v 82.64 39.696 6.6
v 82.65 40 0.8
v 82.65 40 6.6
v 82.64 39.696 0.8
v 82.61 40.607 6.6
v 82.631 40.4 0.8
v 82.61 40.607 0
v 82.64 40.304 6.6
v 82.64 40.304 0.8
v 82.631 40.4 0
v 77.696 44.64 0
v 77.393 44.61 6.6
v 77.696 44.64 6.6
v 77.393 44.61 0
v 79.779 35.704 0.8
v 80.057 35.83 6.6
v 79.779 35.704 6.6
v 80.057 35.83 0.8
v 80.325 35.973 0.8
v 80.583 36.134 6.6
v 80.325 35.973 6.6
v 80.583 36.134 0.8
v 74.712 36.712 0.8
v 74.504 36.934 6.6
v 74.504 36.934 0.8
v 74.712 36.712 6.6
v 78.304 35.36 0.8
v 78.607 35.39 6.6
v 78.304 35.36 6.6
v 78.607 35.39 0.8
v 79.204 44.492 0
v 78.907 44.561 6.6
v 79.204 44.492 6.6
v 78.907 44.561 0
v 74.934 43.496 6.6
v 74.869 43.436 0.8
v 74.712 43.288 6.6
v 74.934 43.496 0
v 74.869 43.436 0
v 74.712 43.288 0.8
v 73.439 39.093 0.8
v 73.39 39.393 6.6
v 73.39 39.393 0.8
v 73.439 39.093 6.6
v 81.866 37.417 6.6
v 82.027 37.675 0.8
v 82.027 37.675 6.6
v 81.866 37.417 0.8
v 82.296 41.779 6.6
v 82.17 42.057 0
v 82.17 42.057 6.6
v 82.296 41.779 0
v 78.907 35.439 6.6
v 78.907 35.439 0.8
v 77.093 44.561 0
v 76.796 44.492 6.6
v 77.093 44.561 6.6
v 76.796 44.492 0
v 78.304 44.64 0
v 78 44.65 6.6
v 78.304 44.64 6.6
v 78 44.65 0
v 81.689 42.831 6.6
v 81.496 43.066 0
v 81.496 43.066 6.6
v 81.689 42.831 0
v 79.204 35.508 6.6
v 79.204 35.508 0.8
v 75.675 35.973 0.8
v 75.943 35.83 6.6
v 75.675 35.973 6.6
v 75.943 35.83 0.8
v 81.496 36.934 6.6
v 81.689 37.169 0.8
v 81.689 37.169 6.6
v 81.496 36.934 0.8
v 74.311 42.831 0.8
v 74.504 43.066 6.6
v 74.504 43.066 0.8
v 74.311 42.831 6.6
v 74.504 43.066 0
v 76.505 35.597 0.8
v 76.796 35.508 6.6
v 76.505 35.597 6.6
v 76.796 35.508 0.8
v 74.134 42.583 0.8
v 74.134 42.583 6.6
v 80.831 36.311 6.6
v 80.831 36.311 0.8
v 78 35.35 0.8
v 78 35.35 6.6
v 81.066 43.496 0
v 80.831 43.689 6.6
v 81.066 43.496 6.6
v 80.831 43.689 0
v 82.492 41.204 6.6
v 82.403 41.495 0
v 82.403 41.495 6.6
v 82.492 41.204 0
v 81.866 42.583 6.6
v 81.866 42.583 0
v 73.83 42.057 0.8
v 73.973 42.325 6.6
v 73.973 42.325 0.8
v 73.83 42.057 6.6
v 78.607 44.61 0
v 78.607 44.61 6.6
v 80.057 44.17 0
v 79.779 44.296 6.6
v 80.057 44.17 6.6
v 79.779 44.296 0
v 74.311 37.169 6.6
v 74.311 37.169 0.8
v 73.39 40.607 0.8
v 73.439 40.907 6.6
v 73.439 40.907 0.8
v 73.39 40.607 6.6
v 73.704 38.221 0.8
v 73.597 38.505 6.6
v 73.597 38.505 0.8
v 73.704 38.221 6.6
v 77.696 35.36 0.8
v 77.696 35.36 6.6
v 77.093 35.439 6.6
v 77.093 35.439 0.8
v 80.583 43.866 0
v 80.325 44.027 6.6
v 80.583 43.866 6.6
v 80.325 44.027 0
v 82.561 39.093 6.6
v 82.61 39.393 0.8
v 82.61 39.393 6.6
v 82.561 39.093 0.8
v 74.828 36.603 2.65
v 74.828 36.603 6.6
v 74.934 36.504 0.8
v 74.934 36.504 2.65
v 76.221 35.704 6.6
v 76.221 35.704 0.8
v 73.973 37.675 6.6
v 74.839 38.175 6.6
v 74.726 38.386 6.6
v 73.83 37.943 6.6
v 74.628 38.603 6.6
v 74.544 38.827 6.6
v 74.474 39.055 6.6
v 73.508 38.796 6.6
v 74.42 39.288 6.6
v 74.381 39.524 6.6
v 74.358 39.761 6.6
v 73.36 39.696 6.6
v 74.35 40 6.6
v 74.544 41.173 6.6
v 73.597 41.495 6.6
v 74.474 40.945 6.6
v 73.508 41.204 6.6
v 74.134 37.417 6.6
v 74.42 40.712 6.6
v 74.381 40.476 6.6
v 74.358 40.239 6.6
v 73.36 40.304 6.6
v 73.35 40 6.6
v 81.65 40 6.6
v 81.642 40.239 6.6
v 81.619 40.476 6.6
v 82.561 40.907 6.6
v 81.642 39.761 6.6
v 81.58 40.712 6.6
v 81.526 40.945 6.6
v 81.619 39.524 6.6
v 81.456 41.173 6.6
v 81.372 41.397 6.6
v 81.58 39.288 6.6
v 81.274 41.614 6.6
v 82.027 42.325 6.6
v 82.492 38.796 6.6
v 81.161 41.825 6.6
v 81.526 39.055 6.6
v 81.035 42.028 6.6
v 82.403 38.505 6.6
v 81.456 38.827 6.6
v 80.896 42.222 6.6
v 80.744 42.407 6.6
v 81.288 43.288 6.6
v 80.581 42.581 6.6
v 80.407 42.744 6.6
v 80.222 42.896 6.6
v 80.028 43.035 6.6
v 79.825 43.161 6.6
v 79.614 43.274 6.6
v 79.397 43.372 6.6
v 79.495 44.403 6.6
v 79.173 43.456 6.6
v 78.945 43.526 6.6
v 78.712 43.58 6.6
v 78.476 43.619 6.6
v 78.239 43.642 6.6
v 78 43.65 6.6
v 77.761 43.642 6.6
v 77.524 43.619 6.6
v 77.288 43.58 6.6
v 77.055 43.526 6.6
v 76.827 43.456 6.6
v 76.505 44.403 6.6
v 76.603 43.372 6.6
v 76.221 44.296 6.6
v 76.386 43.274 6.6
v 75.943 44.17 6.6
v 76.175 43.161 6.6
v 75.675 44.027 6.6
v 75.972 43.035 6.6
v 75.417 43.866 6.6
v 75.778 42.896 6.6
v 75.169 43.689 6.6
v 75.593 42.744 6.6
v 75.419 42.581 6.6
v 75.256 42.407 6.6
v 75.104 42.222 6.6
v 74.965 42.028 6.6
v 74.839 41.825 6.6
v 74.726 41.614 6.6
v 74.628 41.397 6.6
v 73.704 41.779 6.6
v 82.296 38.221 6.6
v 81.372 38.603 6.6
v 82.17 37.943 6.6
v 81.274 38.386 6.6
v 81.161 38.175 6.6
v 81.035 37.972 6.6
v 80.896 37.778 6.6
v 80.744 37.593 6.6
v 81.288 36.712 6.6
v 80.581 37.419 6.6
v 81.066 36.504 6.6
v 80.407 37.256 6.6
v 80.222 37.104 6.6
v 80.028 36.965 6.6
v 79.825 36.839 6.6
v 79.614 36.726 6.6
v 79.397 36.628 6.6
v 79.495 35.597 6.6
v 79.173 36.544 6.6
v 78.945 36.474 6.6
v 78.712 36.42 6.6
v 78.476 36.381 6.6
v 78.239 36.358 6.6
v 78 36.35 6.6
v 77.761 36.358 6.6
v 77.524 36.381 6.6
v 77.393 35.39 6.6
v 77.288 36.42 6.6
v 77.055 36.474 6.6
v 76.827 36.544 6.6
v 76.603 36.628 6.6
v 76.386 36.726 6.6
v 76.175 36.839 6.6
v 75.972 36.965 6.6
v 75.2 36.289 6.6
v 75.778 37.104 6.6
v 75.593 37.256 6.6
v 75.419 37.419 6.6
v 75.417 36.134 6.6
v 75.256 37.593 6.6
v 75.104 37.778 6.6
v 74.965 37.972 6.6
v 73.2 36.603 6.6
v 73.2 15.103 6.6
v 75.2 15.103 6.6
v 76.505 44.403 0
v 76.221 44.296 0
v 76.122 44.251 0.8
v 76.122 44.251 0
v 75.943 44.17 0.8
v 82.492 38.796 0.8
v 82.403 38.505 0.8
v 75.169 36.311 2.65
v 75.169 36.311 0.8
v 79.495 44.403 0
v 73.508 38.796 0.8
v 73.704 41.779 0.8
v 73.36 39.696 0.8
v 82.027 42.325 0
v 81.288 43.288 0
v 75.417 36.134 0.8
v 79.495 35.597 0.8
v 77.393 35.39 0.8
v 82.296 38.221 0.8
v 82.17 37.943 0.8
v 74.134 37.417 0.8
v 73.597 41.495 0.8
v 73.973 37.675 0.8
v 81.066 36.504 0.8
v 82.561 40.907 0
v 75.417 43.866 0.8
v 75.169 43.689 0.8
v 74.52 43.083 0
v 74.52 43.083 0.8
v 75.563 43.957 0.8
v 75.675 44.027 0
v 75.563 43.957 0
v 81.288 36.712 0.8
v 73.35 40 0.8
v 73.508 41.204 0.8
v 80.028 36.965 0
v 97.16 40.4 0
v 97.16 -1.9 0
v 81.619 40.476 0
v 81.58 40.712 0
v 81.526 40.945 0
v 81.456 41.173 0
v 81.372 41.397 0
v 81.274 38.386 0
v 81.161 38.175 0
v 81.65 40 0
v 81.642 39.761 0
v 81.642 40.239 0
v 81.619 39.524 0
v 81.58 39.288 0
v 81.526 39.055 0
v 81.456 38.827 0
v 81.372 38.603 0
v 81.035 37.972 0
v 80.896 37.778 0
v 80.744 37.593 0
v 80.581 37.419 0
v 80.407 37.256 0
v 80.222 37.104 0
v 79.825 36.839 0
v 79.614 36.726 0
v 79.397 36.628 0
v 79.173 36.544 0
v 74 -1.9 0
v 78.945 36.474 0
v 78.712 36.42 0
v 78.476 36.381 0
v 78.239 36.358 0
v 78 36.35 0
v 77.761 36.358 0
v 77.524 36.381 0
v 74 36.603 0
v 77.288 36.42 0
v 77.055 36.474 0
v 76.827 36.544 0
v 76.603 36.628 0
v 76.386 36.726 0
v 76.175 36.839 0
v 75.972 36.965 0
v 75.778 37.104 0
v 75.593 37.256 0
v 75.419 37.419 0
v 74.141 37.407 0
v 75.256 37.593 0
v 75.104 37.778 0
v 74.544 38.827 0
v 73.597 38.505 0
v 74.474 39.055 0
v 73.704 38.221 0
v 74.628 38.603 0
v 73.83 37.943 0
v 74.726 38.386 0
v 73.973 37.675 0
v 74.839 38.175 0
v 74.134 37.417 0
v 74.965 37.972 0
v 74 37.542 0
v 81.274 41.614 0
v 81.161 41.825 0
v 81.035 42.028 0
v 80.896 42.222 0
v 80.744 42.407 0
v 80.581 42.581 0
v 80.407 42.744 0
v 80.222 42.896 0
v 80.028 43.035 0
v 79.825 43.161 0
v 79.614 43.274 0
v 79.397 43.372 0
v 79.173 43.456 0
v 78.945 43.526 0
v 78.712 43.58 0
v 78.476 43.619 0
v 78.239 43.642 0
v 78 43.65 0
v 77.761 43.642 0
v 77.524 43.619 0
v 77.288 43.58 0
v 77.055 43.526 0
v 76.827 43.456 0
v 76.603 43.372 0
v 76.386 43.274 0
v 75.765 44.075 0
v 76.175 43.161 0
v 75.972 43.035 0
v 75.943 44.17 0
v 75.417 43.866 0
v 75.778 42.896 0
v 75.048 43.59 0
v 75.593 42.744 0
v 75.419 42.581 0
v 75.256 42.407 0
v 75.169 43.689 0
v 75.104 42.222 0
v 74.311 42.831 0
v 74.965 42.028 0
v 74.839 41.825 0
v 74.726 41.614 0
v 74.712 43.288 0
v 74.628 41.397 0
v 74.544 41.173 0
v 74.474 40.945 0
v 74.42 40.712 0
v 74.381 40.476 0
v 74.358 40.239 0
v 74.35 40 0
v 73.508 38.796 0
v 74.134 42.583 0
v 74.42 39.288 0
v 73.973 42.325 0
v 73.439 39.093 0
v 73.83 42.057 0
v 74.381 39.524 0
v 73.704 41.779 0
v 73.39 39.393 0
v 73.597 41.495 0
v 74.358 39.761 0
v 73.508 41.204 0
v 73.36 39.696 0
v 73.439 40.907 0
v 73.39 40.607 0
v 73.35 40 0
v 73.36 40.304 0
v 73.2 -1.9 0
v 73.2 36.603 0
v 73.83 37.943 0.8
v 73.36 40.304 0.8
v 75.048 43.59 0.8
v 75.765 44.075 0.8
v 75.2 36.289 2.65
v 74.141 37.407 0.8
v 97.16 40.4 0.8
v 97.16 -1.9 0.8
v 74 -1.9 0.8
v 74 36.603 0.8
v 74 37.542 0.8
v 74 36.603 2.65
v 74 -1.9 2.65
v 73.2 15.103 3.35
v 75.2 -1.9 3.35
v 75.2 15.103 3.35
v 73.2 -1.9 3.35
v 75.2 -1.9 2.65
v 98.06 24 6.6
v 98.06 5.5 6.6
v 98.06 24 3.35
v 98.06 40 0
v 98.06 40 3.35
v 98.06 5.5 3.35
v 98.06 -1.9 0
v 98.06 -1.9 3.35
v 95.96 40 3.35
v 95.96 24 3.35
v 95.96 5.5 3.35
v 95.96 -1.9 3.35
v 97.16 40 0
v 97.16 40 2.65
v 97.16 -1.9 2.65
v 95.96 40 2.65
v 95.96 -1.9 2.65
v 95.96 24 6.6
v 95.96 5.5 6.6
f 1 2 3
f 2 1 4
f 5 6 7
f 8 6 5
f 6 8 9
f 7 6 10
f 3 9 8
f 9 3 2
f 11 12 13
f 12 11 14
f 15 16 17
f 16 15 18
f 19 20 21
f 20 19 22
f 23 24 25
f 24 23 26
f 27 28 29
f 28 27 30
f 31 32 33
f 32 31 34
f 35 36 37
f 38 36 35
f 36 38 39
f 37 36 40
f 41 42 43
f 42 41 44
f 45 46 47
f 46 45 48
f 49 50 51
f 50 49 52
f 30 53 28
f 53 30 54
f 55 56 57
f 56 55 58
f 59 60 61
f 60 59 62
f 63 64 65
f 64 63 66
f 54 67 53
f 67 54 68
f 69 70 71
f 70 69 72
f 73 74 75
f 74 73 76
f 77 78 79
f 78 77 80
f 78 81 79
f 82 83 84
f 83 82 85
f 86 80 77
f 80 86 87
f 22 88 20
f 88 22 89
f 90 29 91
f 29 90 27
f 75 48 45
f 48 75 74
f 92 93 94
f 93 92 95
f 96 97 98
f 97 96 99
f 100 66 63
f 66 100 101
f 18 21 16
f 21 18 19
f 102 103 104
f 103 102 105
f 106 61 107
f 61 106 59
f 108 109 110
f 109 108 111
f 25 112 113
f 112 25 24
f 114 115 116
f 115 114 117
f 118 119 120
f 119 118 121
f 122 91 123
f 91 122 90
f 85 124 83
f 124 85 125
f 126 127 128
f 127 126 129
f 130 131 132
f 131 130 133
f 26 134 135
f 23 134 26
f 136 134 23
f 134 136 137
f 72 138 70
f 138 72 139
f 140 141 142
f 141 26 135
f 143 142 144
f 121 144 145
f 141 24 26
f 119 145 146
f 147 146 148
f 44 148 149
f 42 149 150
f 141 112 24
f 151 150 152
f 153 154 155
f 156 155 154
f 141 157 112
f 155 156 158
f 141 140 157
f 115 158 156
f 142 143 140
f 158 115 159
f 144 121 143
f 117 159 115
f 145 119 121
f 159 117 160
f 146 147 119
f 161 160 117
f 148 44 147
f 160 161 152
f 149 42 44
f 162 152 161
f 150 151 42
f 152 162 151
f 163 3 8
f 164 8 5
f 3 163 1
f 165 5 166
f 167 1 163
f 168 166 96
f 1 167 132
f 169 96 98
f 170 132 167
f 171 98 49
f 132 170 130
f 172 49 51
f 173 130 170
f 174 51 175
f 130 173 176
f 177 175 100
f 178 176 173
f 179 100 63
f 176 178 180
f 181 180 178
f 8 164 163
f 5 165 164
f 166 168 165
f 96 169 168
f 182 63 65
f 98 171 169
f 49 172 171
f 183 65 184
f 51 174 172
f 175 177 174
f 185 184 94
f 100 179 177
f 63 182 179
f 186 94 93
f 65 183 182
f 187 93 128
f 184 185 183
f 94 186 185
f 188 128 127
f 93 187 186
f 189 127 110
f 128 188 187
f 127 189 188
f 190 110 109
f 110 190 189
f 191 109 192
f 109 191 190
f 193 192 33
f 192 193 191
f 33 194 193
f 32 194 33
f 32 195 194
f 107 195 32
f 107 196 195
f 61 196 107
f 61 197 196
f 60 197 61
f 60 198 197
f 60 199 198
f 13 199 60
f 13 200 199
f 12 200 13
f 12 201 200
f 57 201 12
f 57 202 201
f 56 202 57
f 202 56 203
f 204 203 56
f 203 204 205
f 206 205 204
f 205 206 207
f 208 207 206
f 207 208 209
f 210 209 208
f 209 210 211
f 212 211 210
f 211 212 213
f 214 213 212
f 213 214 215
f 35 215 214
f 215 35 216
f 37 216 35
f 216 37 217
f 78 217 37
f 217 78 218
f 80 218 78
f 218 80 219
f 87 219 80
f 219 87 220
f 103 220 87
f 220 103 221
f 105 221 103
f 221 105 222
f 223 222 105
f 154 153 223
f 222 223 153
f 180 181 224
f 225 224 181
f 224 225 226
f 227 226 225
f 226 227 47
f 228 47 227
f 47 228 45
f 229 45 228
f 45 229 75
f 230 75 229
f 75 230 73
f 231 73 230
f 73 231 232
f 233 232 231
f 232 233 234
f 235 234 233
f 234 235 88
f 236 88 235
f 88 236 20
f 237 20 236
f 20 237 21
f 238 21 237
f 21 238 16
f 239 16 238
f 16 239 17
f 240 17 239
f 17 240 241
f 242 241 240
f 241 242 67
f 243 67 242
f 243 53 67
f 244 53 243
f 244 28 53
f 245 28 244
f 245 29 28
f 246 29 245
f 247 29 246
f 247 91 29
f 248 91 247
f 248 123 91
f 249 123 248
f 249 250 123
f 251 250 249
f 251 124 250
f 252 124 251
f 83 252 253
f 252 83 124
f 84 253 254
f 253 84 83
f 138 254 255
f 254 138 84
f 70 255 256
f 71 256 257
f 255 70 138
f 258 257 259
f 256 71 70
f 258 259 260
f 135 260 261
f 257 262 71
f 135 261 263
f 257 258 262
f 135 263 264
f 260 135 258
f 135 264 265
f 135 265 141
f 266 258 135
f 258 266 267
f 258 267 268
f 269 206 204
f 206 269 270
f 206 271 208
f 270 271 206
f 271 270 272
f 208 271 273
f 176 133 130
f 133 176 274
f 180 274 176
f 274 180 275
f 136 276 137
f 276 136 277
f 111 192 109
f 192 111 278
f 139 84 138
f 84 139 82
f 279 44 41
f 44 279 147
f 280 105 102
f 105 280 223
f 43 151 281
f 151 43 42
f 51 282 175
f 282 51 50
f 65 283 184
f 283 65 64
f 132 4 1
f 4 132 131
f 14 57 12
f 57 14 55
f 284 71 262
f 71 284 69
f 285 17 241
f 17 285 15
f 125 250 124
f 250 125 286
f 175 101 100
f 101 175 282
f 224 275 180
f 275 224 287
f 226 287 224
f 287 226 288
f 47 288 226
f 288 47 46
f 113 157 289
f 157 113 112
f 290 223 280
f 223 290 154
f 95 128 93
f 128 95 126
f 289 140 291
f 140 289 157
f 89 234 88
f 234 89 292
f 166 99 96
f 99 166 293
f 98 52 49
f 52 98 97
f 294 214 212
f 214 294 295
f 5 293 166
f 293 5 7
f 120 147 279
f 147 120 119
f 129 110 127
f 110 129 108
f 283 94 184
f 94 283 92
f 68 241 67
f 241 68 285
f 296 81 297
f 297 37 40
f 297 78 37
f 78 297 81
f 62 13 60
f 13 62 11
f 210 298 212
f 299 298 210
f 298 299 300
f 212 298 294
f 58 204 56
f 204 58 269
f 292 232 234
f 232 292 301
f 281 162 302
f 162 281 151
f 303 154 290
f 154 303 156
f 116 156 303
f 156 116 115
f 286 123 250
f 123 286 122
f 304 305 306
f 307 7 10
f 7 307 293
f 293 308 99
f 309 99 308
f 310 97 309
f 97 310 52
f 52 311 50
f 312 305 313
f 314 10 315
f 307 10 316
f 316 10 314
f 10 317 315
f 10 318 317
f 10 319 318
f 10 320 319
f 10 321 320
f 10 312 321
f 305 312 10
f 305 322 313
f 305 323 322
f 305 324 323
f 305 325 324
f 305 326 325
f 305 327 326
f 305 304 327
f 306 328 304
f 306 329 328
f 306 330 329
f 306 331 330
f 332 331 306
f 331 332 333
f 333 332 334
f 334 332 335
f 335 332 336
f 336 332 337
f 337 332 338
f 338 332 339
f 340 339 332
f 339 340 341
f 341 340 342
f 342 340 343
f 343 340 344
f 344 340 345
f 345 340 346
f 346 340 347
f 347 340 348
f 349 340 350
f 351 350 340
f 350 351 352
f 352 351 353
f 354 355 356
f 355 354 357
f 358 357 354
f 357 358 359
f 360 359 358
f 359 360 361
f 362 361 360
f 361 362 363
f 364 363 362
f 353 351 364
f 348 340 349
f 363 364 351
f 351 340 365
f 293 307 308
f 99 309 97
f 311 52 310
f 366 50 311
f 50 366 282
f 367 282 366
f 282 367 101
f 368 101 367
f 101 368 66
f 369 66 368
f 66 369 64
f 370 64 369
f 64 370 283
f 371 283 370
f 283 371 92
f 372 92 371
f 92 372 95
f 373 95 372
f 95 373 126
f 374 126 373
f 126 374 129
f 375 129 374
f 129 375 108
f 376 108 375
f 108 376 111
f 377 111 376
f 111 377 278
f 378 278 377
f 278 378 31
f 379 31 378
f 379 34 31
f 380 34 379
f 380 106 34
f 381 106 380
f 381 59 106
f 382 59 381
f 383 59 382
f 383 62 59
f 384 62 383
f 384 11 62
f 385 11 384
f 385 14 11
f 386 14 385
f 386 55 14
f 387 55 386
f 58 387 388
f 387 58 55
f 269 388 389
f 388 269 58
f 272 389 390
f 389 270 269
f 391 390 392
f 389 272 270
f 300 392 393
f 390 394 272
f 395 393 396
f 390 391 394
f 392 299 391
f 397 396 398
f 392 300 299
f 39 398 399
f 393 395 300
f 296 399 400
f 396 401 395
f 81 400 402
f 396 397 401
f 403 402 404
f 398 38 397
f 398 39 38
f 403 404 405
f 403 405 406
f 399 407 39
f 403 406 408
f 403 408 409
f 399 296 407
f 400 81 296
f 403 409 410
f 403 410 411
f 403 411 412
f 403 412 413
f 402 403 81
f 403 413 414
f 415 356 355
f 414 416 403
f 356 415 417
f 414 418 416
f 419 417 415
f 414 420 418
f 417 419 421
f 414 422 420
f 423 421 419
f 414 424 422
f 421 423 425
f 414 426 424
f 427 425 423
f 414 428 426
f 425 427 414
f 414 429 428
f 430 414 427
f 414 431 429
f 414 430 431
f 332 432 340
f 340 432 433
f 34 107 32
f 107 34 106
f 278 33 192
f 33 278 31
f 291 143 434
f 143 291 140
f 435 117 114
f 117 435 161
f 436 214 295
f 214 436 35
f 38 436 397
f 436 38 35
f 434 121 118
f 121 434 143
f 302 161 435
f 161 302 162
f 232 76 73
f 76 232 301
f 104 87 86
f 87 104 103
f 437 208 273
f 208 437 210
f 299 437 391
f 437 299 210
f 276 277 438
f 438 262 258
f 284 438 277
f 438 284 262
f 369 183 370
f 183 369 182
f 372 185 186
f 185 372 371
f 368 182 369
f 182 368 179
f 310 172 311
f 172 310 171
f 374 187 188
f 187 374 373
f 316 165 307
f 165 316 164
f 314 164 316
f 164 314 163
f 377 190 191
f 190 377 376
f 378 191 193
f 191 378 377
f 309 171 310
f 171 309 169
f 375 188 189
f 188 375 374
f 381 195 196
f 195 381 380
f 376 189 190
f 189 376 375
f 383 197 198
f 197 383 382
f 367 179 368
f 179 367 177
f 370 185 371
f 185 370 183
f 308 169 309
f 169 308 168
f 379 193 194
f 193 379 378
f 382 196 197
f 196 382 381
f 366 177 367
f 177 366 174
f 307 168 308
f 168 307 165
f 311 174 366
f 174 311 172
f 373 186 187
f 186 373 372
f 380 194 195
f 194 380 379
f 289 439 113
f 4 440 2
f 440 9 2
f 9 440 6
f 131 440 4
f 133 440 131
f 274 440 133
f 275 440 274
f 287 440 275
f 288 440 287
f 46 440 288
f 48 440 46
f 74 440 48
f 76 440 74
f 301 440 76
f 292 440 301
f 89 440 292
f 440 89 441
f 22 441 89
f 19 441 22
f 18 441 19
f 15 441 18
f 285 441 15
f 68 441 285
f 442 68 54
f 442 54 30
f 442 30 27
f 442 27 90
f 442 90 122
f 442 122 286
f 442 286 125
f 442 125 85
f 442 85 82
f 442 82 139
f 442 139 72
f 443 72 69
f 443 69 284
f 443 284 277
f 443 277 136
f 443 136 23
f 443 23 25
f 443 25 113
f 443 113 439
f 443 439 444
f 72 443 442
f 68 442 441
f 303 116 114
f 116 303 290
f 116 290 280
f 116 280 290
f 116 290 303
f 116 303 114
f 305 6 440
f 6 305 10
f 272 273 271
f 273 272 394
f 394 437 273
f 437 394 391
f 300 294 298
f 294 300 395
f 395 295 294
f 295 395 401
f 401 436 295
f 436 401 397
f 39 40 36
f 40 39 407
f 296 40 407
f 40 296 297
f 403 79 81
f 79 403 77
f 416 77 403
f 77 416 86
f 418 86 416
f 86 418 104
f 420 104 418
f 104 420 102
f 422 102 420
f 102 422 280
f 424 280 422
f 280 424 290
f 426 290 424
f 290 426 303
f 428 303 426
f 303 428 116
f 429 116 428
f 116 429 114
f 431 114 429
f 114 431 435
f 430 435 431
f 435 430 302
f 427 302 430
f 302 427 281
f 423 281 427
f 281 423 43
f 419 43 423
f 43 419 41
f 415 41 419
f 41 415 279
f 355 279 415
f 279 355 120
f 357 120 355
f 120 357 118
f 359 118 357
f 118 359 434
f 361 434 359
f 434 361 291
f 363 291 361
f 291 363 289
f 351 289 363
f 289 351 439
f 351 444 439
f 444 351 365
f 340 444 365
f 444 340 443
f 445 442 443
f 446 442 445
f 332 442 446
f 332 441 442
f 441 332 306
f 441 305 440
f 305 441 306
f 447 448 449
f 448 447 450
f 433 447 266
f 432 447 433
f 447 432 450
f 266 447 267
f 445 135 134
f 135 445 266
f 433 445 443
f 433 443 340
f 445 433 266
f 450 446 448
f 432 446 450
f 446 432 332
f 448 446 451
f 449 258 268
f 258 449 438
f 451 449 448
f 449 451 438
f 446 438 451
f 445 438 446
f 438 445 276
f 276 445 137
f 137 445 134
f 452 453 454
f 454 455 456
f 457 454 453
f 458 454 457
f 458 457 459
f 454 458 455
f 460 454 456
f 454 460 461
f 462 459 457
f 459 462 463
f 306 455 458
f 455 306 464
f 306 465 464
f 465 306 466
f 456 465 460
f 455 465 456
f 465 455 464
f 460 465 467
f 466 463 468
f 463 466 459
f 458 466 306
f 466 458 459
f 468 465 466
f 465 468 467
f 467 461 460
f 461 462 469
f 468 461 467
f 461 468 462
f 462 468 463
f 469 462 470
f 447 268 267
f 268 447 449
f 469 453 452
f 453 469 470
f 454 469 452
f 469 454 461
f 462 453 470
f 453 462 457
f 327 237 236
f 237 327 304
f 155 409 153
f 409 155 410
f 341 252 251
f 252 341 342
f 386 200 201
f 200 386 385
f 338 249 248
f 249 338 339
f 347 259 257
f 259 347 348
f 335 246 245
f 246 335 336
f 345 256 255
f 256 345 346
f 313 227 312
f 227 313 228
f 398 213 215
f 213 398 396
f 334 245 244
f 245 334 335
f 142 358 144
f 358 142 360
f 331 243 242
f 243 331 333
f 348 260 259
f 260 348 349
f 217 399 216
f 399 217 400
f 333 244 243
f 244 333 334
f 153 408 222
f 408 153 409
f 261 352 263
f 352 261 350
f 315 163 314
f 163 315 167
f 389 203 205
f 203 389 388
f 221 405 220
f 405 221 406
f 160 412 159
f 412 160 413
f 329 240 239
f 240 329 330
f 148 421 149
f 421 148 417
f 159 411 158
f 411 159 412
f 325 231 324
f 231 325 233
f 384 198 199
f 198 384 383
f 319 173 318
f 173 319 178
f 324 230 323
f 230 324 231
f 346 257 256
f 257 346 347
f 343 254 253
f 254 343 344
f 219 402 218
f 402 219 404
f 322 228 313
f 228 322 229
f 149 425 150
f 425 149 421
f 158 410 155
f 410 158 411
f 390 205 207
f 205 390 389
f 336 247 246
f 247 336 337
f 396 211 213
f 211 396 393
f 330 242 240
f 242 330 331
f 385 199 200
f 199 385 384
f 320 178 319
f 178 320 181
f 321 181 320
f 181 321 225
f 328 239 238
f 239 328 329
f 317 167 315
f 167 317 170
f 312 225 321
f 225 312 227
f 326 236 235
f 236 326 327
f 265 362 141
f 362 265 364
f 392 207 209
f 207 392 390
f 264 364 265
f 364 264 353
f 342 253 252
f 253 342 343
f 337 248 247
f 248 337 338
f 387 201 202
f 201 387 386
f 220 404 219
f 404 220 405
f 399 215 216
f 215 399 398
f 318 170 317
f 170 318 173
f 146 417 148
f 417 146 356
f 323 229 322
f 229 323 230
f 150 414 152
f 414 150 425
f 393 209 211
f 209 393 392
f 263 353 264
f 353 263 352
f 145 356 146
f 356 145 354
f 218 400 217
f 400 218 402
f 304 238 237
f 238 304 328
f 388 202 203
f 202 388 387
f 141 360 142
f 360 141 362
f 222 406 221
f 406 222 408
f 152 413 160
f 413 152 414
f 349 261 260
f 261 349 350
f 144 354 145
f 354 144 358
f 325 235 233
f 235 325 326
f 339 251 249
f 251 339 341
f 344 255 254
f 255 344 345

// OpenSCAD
// generated by make_tray.py: the SD board's tray (u, v in mm from the FM-1 board's left and bottom edges)
$fn = 96;
difference() { union() {
  linear_extrude(0.8) union() { intersection() { offset(delta=0.4) polygon([[96.76, -1.5], [74.4, -1.5], [74.4, 36.603], [74.755, 36.262], [75.142, 35.959], [75.557, 35.695], [75.996, 35.474], [76.455, 35.297], [76.929, 35.167], [77.414, 35.085], [77.904, 35.051], [78.396, 35.066], [78.884, 35.13], [79.362, 35.241], [79.828, 35.4], [80.275, 35.604], [80.7, 35.851], [81.099, 36.14], [81.466, 36.466], [81.8, 36.828], [82.096, 37.22], [82.351, 37.64], [82.564, 38.084], [82.732, 38.546], [82.853, 39.023], [82.926, 39.509], [82.95, 40.0], [90.5, 40.0], [90.5, 51.5], [86.0, 51.5], [86.0, 76.7], [96.76, 76.7]]); translate([0, -50]) square([300, 90.4]); }
    translate([78.0, 40.0]) circle(r=4.65); }
  translate([73.200, -1.900, 0.000]) cube([0.800, 38.503, 3.350]);   // the left rail
  translate([73.200, -1.900, 2.650]) cube([2.000, 38.503, 0.700]);   // its lip
  translate([97.160, -1.900, 0.000]) cube([0.900, 41.900, 3.350]);   // the right rail
  translate([95.960, -1.900, 2.650]) cube([2.100, 41.900, 0.700]);   // its lip
  translate([73.200, 15.103, 2.650]) cube([2.000, 21.500, 3.950]);   // a post
  translate([95.960, 5.500, 2.650]) cube([2.100, 18.500, 3.950]);   // a post
  translate([78.0, 40.0, 0]) difference() { cylinder(r=4.65, h=6.6); translate([0, 0, -1]) cylinder(r=3.6500000000000004, h=8.6); }   // the collar
}
  translate([78.0, 40.0, -1]) cylinder(r=3.6500000000000004, h=8.6);
}
